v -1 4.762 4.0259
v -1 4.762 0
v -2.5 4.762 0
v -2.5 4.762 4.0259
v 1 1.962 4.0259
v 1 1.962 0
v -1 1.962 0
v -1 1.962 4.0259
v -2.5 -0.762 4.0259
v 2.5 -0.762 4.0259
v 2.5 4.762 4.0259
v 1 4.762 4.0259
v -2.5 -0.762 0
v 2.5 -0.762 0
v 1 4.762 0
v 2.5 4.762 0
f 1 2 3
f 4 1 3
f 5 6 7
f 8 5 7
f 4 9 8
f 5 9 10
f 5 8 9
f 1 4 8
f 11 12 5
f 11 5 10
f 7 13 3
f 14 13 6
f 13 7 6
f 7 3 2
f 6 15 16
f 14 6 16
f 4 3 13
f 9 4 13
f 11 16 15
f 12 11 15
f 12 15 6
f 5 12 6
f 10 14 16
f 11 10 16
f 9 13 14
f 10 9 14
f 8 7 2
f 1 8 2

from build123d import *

# Parameters (mm, degrees)
SKETCH1_W           = 5
SKETCH1_H           = 1.524
BOSS_EXTRUDE1_DEPTH = 4.0259


with BuildPart() as part:
    # Sketch1 → Boss-Extrude1 (new body)
    with BuildSketch(Plane.XY):
        Polygon((-1, 1.962), (-1, 4.762), (-2.5, 4.762), (-2.5, 0.762), (2.5, 0.762), (2.5, 4.762), (1, 4.762), (1, 1.962), align=None)
        Rectangle(SKETCH1_W, SKETCH1_H)
    extrude(amount=BOSS_EXTRUDE1_DEPTH)


solid = part.part
